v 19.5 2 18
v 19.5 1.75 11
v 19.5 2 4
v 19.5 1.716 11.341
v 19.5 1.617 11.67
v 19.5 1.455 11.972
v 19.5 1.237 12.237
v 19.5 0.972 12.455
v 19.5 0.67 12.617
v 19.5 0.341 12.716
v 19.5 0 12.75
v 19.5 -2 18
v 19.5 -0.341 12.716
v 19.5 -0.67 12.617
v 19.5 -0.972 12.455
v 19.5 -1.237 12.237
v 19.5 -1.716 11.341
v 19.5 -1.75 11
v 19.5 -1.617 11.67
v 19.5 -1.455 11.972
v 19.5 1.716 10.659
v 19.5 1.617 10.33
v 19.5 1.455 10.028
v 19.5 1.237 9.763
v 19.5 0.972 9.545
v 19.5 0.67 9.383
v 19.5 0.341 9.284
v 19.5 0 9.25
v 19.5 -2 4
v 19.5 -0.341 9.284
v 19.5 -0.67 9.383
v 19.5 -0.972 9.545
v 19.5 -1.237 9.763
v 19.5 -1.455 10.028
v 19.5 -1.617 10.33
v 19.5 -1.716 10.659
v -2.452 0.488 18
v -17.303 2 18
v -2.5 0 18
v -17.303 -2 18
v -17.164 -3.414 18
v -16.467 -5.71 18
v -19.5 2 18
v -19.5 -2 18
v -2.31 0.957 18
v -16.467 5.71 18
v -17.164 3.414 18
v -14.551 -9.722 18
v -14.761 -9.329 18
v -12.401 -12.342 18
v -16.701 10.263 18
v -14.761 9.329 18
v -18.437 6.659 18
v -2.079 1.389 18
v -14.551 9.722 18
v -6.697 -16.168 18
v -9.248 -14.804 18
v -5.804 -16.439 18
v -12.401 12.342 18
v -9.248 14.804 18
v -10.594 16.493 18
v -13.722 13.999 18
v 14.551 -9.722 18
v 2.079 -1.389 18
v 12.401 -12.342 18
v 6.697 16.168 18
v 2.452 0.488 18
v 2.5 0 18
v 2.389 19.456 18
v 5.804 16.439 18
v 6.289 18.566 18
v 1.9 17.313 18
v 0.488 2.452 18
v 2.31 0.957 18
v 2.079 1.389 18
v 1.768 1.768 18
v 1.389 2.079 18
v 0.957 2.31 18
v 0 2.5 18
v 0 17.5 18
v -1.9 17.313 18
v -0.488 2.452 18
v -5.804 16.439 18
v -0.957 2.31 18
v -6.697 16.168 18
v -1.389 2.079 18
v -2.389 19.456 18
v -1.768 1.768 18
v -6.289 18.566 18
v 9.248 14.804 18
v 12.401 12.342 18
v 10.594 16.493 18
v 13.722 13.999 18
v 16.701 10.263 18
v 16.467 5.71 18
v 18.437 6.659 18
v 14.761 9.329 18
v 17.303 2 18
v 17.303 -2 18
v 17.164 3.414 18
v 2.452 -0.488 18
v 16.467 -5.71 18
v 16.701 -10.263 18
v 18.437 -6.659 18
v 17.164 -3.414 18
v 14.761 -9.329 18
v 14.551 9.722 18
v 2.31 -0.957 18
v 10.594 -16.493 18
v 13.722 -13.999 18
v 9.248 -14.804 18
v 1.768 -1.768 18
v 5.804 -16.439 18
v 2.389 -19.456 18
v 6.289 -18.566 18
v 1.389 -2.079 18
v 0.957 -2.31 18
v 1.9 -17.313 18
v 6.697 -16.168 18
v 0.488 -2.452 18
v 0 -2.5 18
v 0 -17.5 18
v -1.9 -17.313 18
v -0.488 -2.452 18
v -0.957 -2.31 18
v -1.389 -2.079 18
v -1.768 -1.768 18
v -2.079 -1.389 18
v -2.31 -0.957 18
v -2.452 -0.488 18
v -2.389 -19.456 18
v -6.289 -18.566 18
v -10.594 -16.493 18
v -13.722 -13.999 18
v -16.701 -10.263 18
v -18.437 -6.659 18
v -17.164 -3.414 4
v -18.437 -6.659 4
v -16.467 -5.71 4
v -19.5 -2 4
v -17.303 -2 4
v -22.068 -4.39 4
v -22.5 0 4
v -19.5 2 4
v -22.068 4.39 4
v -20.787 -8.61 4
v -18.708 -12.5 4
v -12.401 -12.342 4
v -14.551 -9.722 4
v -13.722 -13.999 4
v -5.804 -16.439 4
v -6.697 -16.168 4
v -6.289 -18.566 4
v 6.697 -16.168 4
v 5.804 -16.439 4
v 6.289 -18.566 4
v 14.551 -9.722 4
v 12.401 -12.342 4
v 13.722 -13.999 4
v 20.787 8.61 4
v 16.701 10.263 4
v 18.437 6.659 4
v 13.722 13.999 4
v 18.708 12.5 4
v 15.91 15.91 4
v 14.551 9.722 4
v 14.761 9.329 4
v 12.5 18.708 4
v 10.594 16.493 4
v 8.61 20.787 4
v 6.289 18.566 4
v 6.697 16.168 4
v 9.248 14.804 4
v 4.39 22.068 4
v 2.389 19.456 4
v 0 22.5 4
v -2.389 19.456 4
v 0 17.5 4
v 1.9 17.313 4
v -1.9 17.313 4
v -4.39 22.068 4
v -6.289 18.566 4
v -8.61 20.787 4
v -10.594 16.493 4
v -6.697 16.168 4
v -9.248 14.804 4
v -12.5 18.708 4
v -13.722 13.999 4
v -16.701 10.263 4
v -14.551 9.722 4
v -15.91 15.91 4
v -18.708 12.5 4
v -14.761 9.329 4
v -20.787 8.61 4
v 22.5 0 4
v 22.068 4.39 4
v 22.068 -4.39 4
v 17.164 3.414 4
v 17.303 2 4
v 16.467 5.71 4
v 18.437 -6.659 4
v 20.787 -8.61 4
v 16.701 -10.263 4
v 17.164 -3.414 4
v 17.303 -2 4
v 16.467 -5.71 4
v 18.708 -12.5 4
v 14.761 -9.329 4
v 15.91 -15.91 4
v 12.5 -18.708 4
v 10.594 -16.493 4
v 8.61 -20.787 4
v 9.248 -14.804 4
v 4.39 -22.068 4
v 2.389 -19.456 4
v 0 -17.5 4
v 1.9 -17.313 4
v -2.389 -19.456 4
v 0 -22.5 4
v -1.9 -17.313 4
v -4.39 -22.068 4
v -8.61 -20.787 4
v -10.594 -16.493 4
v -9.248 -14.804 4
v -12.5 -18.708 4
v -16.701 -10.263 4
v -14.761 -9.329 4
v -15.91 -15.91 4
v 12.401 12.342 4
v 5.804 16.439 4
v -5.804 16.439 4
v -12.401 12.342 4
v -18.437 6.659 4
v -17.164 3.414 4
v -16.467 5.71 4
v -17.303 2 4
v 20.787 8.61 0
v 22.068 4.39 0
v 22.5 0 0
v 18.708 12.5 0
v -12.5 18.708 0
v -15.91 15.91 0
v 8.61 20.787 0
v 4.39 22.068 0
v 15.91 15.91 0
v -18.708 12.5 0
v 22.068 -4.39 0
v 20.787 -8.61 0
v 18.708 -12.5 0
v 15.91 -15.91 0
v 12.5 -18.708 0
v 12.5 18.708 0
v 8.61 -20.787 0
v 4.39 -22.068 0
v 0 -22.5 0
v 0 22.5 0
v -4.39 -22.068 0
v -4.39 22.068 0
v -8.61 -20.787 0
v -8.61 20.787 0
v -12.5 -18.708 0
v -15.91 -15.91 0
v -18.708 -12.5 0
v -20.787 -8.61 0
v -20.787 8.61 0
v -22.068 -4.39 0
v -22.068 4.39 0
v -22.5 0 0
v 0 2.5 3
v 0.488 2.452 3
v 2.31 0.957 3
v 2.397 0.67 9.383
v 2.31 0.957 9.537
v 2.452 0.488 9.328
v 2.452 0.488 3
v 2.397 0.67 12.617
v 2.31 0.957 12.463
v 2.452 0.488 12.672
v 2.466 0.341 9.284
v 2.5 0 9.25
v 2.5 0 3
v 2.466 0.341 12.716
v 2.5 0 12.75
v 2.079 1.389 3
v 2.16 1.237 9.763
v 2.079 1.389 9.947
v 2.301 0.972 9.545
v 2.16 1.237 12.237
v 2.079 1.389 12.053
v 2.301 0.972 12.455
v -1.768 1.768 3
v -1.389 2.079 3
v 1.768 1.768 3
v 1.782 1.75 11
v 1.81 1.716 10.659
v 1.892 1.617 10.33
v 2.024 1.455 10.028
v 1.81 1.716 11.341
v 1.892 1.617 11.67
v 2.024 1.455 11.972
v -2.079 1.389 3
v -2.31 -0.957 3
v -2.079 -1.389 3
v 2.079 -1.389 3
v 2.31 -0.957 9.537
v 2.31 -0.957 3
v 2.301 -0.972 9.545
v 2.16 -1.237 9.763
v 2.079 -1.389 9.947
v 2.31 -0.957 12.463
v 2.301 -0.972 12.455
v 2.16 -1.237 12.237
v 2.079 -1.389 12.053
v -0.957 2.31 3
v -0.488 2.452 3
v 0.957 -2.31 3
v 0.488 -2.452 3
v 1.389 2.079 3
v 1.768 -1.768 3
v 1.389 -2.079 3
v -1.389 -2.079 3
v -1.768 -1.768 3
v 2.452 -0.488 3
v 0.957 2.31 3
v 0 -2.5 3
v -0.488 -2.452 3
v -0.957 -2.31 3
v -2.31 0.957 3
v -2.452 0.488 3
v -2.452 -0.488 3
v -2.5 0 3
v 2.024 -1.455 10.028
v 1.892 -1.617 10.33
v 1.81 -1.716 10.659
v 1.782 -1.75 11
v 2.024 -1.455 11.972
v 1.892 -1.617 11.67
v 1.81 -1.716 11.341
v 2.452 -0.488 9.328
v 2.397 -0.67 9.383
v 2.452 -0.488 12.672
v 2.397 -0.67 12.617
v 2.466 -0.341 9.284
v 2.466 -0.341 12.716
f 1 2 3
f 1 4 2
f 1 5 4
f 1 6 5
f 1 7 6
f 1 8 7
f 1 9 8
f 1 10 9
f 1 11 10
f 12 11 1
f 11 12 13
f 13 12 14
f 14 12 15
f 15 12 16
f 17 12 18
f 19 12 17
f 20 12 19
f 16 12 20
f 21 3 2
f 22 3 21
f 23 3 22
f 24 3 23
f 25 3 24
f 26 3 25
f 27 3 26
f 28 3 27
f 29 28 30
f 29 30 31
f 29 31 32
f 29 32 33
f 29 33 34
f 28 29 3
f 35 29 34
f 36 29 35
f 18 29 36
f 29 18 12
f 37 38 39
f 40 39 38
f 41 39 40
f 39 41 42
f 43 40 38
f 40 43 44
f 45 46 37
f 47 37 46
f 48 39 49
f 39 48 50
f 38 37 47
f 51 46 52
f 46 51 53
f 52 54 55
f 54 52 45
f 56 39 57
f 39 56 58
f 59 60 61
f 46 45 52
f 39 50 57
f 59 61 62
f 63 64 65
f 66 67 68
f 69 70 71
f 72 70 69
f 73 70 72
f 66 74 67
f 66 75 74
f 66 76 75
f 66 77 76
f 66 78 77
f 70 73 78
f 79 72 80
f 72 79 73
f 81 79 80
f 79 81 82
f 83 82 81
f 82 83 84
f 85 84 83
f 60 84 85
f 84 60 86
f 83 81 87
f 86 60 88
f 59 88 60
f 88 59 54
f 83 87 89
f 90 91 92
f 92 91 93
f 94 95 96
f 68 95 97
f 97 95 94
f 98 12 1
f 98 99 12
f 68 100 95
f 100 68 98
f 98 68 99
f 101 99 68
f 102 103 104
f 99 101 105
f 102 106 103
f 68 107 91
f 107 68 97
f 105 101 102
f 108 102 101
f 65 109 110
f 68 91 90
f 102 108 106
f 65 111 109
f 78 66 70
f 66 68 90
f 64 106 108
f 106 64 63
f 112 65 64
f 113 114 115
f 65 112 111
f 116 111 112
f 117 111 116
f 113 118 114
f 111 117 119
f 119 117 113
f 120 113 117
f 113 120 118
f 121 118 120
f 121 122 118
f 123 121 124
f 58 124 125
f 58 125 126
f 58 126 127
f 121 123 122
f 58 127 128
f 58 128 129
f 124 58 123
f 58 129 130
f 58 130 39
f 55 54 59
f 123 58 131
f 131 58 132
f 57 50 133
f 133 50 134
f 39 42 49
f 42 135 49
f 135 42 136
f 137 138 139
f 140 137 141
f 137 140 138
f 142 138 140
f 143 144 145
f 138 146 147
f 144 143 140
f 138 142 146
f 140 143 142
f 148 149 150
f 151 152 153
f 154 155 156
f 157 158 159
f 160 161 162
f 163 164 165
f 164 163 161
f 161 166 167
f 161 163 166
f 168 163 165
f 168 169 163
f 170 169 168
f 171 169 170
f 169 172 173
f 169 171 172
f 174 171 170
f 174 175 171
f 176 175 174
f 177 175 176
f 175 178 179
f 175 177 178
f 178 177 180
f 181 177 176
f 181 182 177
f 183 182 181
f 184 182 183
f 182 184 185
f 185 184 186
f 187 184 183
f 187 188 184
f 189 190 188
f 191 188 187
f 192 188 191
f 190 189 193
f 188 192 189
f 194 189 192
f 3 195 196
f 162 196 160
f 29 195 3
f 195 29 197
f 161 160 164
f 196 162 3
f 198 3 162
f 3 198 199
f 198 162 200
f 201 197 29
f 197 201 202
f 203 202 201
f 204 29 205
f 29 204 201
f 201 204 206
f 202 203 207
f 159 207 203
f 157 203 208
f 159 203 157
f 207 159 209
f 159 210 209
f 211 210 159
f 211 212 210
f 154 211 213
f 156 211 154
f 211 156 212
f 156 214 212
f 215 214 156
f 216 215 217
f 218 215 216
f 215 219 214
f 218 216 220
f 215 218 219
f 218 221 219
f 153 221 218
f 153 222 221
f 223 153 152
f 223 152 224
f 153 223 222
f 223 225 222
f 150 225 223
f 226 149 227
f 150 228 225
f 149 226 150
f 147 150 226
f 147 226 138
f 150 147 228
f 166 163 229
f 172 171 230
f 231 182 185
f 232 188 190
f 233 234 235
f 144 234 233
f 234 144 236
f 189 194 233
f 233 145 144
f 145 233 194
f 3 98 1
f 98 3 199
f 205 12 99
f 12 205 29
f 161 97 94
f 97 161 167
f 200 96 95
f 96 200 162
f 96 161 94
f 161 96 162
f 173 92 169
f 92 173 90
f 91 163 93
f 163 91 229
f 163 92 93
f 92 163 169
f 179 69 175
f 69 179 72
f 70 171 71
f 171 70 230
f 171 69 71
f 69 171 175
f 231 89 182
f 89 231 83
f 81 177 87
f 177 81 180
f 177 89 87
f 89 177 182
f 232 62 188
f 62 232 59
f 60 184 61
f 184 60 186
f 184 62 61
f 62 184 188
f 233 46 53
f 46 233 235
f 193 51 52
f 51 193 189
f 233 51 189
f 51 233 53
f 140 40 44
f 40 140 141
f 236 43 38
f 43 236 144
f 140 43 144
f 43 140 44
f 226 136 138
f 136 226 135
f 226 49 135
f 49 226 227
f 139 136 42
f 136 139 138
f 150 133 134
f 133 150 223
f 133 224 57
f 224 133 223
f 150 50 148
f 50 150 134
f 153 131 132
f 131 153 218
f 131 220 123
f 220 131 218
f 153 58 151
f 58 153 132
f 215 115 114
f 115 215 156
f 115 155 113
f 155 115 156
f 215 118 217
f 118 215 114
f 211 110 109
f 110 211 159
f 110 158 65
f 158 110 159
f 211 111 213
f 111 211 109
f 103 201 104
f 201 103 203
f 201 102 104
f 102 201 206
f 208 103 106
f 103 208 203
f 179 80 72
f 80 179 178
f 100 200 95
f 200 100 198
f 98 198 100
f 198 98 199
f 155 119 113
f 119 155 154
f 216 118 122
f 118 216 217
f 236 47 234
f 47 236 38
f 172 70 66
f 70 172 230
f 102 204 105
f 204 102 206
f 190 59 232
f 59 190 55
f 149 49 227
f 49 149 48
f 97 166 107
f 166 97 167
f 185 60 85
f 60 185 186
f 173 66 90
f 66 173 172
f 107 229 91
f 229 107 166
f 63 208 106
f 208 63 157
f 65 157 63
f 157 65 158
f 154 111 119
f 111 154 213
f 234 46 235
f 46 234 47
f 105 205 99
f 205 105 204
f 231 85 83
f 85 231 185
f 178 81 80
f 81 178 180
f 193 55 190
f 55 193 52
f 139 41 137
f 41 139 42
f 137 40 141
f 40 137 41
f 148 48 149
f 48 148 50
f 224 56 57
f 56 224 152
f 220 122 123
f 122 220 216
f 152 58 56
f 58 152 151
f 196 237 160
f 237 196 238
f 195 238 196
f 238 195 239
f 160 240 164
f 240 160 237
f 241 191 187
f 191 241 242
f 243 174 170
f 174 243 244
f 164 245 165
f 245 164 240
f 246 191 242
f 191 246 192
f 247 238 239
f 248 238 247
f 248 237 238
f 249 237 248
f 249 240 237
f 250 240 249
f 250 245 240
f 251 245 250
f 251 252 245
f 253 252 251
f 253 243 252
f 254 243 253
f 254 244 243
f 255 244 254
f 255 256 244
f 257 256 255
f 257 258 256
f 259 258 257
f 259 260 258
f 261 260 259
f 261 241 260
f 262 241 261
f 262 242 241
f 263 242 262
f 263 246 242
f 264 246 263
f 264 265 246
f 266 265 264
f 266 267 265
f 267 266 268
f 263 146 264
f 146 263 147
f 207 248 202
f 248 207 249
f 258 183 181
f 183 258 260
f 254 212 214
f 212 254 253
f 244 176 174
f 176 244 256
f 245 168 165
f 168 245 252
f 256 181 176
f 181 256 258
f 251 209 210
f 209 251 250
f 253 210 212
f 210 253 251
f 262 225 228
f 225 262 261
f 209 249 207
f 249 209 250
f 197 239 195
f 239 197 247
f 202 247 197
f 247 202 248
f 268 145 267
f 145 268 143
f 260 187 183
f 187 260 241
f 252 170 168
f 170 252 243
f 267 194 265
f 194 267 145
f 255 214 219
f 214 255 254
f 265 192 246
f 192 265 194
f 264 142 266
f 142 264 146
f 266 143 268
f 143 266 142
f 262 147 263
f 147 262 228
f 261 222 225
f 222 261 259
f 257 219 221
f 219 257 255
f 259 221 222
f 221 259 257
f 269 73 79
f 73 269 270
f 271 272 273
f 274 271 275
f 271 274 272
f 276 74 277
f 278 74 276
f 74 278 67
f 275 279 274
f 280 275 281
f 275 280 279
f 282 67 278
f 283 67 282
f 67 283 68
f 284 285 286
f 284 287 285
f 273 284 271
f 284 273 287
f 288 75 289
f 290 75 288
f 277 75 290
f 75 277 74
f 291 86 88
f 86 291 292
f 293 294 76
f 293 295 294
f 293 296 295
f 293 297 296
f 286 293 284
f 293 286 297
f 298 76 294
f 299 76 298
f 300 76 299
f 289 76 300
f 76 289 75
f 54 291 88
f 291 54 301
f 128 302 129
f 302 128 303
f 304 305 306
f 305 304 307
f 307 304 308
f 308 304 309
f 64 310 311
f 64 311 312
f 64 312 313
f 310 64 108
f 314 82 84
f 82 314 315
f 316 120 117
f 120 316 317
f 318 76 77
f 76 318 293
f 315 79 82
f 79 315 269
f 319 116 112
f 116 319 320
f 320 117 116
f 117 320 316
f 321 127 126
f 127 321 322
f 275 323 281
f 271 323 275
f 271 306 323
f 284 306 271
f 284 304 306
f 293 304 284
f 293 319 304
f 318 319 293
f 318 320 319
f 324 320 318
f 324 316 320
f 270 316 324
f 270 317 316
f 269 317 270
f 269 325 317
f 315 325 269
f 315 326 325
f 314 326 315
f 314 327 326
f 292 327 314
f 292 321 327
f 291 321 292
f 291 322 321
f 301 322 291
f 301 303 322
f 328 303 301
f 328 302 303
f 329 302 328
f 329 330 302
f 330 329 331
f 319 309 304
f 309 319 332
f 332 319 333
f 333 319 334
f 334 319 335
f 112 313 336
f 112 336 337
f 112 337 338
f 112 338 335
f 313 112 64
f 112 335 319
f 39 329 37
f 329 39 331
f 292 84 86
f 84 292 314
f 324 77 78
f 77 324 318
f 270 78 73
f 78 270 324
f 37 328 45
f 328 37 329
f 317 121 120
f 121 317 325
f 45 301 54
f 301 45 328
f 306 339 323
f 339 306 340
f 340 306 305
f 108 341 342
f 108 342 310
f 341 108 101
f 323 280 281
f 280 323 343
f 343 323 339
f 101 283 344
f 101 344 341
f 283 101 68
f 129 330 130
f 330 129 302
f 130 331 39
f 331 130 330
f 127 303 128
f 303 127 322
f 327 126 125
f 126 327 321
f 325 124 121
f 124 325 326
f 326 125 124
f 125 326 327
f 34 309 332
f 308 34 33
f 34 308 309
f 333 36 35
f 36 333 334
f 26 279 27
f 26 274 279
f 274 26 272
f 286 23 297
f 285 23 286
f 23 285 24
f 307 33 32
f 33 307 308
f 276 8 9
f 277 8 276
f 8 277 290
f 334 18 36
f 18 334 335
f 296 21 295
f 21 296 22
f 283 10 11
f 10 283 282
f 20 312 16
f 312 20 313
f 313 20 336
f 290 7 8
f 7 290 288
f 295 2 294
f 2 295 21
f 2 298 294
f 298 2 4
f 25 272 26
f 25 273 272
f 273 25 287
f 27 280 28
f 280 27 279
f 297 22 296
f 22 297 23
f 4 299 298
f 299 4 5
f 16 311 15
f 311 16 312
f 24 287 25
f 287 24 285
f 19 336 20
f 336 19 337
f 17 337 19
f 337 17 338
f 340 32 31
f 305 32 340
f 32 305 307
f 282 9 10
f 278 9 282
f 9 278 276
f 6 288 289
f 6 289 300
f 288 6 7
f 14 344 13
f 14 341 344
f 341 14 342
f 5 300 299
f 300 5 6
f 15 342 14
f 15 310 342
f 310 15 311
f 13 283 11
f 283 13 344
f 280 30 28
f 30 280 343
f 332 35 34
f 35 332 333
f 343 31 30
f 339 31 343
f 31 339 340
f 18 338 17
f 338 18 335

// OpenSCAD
$fn = 32;

// ----------------------------------------------------------------------
// Control knob: skirt knob with grip ribs
// ----------------------------------------------------------------------

// --- parameters (mm) ---
skirt_d = 45;             // skirt diameter
skirt_t = 4;              // skirt thickness
rib_w = 4;                // grip rib width
rib_out = 3;              // grip rib radial protrusion
n_ribs = 14;              // number of grip ribs
knob_d = 35;              // knob body diameter
knob_h = 14;              // knob body height
bore_d = 5;               // shaft bore diameter
set_d = 3.5;              // set screw bore diameter

rib_step = 360 / n_ribs;  // rib angular step
total_h = skirt_t + knob_h;  // overall height

difference() {
  union() {
    translate([0, 0, skirt_t]) cylinder(h = knob_h, d = knob_d);
    cylinder(h = skirt_t, d = skirt_d);
    for (i = [0 : n_ribs - 1])
      rotate([0, 0, i * rib_step])
        translate([knob_d / 2 - 1, -rib_w / 2, skirt_t])
          cube([rib_out, rib_w, knob_h]);
  }
  translate([0, 0, skirt_t - 1]) cylinder(h = knob_h + 2, d = bore_d);
  translate([-1, 0, skirt_t + knob_h / 2]) rotate([0, 90, 0])
    cylinder(h = knob_d / 2 + bore_d / 2 + 2, d = set_d);
}
